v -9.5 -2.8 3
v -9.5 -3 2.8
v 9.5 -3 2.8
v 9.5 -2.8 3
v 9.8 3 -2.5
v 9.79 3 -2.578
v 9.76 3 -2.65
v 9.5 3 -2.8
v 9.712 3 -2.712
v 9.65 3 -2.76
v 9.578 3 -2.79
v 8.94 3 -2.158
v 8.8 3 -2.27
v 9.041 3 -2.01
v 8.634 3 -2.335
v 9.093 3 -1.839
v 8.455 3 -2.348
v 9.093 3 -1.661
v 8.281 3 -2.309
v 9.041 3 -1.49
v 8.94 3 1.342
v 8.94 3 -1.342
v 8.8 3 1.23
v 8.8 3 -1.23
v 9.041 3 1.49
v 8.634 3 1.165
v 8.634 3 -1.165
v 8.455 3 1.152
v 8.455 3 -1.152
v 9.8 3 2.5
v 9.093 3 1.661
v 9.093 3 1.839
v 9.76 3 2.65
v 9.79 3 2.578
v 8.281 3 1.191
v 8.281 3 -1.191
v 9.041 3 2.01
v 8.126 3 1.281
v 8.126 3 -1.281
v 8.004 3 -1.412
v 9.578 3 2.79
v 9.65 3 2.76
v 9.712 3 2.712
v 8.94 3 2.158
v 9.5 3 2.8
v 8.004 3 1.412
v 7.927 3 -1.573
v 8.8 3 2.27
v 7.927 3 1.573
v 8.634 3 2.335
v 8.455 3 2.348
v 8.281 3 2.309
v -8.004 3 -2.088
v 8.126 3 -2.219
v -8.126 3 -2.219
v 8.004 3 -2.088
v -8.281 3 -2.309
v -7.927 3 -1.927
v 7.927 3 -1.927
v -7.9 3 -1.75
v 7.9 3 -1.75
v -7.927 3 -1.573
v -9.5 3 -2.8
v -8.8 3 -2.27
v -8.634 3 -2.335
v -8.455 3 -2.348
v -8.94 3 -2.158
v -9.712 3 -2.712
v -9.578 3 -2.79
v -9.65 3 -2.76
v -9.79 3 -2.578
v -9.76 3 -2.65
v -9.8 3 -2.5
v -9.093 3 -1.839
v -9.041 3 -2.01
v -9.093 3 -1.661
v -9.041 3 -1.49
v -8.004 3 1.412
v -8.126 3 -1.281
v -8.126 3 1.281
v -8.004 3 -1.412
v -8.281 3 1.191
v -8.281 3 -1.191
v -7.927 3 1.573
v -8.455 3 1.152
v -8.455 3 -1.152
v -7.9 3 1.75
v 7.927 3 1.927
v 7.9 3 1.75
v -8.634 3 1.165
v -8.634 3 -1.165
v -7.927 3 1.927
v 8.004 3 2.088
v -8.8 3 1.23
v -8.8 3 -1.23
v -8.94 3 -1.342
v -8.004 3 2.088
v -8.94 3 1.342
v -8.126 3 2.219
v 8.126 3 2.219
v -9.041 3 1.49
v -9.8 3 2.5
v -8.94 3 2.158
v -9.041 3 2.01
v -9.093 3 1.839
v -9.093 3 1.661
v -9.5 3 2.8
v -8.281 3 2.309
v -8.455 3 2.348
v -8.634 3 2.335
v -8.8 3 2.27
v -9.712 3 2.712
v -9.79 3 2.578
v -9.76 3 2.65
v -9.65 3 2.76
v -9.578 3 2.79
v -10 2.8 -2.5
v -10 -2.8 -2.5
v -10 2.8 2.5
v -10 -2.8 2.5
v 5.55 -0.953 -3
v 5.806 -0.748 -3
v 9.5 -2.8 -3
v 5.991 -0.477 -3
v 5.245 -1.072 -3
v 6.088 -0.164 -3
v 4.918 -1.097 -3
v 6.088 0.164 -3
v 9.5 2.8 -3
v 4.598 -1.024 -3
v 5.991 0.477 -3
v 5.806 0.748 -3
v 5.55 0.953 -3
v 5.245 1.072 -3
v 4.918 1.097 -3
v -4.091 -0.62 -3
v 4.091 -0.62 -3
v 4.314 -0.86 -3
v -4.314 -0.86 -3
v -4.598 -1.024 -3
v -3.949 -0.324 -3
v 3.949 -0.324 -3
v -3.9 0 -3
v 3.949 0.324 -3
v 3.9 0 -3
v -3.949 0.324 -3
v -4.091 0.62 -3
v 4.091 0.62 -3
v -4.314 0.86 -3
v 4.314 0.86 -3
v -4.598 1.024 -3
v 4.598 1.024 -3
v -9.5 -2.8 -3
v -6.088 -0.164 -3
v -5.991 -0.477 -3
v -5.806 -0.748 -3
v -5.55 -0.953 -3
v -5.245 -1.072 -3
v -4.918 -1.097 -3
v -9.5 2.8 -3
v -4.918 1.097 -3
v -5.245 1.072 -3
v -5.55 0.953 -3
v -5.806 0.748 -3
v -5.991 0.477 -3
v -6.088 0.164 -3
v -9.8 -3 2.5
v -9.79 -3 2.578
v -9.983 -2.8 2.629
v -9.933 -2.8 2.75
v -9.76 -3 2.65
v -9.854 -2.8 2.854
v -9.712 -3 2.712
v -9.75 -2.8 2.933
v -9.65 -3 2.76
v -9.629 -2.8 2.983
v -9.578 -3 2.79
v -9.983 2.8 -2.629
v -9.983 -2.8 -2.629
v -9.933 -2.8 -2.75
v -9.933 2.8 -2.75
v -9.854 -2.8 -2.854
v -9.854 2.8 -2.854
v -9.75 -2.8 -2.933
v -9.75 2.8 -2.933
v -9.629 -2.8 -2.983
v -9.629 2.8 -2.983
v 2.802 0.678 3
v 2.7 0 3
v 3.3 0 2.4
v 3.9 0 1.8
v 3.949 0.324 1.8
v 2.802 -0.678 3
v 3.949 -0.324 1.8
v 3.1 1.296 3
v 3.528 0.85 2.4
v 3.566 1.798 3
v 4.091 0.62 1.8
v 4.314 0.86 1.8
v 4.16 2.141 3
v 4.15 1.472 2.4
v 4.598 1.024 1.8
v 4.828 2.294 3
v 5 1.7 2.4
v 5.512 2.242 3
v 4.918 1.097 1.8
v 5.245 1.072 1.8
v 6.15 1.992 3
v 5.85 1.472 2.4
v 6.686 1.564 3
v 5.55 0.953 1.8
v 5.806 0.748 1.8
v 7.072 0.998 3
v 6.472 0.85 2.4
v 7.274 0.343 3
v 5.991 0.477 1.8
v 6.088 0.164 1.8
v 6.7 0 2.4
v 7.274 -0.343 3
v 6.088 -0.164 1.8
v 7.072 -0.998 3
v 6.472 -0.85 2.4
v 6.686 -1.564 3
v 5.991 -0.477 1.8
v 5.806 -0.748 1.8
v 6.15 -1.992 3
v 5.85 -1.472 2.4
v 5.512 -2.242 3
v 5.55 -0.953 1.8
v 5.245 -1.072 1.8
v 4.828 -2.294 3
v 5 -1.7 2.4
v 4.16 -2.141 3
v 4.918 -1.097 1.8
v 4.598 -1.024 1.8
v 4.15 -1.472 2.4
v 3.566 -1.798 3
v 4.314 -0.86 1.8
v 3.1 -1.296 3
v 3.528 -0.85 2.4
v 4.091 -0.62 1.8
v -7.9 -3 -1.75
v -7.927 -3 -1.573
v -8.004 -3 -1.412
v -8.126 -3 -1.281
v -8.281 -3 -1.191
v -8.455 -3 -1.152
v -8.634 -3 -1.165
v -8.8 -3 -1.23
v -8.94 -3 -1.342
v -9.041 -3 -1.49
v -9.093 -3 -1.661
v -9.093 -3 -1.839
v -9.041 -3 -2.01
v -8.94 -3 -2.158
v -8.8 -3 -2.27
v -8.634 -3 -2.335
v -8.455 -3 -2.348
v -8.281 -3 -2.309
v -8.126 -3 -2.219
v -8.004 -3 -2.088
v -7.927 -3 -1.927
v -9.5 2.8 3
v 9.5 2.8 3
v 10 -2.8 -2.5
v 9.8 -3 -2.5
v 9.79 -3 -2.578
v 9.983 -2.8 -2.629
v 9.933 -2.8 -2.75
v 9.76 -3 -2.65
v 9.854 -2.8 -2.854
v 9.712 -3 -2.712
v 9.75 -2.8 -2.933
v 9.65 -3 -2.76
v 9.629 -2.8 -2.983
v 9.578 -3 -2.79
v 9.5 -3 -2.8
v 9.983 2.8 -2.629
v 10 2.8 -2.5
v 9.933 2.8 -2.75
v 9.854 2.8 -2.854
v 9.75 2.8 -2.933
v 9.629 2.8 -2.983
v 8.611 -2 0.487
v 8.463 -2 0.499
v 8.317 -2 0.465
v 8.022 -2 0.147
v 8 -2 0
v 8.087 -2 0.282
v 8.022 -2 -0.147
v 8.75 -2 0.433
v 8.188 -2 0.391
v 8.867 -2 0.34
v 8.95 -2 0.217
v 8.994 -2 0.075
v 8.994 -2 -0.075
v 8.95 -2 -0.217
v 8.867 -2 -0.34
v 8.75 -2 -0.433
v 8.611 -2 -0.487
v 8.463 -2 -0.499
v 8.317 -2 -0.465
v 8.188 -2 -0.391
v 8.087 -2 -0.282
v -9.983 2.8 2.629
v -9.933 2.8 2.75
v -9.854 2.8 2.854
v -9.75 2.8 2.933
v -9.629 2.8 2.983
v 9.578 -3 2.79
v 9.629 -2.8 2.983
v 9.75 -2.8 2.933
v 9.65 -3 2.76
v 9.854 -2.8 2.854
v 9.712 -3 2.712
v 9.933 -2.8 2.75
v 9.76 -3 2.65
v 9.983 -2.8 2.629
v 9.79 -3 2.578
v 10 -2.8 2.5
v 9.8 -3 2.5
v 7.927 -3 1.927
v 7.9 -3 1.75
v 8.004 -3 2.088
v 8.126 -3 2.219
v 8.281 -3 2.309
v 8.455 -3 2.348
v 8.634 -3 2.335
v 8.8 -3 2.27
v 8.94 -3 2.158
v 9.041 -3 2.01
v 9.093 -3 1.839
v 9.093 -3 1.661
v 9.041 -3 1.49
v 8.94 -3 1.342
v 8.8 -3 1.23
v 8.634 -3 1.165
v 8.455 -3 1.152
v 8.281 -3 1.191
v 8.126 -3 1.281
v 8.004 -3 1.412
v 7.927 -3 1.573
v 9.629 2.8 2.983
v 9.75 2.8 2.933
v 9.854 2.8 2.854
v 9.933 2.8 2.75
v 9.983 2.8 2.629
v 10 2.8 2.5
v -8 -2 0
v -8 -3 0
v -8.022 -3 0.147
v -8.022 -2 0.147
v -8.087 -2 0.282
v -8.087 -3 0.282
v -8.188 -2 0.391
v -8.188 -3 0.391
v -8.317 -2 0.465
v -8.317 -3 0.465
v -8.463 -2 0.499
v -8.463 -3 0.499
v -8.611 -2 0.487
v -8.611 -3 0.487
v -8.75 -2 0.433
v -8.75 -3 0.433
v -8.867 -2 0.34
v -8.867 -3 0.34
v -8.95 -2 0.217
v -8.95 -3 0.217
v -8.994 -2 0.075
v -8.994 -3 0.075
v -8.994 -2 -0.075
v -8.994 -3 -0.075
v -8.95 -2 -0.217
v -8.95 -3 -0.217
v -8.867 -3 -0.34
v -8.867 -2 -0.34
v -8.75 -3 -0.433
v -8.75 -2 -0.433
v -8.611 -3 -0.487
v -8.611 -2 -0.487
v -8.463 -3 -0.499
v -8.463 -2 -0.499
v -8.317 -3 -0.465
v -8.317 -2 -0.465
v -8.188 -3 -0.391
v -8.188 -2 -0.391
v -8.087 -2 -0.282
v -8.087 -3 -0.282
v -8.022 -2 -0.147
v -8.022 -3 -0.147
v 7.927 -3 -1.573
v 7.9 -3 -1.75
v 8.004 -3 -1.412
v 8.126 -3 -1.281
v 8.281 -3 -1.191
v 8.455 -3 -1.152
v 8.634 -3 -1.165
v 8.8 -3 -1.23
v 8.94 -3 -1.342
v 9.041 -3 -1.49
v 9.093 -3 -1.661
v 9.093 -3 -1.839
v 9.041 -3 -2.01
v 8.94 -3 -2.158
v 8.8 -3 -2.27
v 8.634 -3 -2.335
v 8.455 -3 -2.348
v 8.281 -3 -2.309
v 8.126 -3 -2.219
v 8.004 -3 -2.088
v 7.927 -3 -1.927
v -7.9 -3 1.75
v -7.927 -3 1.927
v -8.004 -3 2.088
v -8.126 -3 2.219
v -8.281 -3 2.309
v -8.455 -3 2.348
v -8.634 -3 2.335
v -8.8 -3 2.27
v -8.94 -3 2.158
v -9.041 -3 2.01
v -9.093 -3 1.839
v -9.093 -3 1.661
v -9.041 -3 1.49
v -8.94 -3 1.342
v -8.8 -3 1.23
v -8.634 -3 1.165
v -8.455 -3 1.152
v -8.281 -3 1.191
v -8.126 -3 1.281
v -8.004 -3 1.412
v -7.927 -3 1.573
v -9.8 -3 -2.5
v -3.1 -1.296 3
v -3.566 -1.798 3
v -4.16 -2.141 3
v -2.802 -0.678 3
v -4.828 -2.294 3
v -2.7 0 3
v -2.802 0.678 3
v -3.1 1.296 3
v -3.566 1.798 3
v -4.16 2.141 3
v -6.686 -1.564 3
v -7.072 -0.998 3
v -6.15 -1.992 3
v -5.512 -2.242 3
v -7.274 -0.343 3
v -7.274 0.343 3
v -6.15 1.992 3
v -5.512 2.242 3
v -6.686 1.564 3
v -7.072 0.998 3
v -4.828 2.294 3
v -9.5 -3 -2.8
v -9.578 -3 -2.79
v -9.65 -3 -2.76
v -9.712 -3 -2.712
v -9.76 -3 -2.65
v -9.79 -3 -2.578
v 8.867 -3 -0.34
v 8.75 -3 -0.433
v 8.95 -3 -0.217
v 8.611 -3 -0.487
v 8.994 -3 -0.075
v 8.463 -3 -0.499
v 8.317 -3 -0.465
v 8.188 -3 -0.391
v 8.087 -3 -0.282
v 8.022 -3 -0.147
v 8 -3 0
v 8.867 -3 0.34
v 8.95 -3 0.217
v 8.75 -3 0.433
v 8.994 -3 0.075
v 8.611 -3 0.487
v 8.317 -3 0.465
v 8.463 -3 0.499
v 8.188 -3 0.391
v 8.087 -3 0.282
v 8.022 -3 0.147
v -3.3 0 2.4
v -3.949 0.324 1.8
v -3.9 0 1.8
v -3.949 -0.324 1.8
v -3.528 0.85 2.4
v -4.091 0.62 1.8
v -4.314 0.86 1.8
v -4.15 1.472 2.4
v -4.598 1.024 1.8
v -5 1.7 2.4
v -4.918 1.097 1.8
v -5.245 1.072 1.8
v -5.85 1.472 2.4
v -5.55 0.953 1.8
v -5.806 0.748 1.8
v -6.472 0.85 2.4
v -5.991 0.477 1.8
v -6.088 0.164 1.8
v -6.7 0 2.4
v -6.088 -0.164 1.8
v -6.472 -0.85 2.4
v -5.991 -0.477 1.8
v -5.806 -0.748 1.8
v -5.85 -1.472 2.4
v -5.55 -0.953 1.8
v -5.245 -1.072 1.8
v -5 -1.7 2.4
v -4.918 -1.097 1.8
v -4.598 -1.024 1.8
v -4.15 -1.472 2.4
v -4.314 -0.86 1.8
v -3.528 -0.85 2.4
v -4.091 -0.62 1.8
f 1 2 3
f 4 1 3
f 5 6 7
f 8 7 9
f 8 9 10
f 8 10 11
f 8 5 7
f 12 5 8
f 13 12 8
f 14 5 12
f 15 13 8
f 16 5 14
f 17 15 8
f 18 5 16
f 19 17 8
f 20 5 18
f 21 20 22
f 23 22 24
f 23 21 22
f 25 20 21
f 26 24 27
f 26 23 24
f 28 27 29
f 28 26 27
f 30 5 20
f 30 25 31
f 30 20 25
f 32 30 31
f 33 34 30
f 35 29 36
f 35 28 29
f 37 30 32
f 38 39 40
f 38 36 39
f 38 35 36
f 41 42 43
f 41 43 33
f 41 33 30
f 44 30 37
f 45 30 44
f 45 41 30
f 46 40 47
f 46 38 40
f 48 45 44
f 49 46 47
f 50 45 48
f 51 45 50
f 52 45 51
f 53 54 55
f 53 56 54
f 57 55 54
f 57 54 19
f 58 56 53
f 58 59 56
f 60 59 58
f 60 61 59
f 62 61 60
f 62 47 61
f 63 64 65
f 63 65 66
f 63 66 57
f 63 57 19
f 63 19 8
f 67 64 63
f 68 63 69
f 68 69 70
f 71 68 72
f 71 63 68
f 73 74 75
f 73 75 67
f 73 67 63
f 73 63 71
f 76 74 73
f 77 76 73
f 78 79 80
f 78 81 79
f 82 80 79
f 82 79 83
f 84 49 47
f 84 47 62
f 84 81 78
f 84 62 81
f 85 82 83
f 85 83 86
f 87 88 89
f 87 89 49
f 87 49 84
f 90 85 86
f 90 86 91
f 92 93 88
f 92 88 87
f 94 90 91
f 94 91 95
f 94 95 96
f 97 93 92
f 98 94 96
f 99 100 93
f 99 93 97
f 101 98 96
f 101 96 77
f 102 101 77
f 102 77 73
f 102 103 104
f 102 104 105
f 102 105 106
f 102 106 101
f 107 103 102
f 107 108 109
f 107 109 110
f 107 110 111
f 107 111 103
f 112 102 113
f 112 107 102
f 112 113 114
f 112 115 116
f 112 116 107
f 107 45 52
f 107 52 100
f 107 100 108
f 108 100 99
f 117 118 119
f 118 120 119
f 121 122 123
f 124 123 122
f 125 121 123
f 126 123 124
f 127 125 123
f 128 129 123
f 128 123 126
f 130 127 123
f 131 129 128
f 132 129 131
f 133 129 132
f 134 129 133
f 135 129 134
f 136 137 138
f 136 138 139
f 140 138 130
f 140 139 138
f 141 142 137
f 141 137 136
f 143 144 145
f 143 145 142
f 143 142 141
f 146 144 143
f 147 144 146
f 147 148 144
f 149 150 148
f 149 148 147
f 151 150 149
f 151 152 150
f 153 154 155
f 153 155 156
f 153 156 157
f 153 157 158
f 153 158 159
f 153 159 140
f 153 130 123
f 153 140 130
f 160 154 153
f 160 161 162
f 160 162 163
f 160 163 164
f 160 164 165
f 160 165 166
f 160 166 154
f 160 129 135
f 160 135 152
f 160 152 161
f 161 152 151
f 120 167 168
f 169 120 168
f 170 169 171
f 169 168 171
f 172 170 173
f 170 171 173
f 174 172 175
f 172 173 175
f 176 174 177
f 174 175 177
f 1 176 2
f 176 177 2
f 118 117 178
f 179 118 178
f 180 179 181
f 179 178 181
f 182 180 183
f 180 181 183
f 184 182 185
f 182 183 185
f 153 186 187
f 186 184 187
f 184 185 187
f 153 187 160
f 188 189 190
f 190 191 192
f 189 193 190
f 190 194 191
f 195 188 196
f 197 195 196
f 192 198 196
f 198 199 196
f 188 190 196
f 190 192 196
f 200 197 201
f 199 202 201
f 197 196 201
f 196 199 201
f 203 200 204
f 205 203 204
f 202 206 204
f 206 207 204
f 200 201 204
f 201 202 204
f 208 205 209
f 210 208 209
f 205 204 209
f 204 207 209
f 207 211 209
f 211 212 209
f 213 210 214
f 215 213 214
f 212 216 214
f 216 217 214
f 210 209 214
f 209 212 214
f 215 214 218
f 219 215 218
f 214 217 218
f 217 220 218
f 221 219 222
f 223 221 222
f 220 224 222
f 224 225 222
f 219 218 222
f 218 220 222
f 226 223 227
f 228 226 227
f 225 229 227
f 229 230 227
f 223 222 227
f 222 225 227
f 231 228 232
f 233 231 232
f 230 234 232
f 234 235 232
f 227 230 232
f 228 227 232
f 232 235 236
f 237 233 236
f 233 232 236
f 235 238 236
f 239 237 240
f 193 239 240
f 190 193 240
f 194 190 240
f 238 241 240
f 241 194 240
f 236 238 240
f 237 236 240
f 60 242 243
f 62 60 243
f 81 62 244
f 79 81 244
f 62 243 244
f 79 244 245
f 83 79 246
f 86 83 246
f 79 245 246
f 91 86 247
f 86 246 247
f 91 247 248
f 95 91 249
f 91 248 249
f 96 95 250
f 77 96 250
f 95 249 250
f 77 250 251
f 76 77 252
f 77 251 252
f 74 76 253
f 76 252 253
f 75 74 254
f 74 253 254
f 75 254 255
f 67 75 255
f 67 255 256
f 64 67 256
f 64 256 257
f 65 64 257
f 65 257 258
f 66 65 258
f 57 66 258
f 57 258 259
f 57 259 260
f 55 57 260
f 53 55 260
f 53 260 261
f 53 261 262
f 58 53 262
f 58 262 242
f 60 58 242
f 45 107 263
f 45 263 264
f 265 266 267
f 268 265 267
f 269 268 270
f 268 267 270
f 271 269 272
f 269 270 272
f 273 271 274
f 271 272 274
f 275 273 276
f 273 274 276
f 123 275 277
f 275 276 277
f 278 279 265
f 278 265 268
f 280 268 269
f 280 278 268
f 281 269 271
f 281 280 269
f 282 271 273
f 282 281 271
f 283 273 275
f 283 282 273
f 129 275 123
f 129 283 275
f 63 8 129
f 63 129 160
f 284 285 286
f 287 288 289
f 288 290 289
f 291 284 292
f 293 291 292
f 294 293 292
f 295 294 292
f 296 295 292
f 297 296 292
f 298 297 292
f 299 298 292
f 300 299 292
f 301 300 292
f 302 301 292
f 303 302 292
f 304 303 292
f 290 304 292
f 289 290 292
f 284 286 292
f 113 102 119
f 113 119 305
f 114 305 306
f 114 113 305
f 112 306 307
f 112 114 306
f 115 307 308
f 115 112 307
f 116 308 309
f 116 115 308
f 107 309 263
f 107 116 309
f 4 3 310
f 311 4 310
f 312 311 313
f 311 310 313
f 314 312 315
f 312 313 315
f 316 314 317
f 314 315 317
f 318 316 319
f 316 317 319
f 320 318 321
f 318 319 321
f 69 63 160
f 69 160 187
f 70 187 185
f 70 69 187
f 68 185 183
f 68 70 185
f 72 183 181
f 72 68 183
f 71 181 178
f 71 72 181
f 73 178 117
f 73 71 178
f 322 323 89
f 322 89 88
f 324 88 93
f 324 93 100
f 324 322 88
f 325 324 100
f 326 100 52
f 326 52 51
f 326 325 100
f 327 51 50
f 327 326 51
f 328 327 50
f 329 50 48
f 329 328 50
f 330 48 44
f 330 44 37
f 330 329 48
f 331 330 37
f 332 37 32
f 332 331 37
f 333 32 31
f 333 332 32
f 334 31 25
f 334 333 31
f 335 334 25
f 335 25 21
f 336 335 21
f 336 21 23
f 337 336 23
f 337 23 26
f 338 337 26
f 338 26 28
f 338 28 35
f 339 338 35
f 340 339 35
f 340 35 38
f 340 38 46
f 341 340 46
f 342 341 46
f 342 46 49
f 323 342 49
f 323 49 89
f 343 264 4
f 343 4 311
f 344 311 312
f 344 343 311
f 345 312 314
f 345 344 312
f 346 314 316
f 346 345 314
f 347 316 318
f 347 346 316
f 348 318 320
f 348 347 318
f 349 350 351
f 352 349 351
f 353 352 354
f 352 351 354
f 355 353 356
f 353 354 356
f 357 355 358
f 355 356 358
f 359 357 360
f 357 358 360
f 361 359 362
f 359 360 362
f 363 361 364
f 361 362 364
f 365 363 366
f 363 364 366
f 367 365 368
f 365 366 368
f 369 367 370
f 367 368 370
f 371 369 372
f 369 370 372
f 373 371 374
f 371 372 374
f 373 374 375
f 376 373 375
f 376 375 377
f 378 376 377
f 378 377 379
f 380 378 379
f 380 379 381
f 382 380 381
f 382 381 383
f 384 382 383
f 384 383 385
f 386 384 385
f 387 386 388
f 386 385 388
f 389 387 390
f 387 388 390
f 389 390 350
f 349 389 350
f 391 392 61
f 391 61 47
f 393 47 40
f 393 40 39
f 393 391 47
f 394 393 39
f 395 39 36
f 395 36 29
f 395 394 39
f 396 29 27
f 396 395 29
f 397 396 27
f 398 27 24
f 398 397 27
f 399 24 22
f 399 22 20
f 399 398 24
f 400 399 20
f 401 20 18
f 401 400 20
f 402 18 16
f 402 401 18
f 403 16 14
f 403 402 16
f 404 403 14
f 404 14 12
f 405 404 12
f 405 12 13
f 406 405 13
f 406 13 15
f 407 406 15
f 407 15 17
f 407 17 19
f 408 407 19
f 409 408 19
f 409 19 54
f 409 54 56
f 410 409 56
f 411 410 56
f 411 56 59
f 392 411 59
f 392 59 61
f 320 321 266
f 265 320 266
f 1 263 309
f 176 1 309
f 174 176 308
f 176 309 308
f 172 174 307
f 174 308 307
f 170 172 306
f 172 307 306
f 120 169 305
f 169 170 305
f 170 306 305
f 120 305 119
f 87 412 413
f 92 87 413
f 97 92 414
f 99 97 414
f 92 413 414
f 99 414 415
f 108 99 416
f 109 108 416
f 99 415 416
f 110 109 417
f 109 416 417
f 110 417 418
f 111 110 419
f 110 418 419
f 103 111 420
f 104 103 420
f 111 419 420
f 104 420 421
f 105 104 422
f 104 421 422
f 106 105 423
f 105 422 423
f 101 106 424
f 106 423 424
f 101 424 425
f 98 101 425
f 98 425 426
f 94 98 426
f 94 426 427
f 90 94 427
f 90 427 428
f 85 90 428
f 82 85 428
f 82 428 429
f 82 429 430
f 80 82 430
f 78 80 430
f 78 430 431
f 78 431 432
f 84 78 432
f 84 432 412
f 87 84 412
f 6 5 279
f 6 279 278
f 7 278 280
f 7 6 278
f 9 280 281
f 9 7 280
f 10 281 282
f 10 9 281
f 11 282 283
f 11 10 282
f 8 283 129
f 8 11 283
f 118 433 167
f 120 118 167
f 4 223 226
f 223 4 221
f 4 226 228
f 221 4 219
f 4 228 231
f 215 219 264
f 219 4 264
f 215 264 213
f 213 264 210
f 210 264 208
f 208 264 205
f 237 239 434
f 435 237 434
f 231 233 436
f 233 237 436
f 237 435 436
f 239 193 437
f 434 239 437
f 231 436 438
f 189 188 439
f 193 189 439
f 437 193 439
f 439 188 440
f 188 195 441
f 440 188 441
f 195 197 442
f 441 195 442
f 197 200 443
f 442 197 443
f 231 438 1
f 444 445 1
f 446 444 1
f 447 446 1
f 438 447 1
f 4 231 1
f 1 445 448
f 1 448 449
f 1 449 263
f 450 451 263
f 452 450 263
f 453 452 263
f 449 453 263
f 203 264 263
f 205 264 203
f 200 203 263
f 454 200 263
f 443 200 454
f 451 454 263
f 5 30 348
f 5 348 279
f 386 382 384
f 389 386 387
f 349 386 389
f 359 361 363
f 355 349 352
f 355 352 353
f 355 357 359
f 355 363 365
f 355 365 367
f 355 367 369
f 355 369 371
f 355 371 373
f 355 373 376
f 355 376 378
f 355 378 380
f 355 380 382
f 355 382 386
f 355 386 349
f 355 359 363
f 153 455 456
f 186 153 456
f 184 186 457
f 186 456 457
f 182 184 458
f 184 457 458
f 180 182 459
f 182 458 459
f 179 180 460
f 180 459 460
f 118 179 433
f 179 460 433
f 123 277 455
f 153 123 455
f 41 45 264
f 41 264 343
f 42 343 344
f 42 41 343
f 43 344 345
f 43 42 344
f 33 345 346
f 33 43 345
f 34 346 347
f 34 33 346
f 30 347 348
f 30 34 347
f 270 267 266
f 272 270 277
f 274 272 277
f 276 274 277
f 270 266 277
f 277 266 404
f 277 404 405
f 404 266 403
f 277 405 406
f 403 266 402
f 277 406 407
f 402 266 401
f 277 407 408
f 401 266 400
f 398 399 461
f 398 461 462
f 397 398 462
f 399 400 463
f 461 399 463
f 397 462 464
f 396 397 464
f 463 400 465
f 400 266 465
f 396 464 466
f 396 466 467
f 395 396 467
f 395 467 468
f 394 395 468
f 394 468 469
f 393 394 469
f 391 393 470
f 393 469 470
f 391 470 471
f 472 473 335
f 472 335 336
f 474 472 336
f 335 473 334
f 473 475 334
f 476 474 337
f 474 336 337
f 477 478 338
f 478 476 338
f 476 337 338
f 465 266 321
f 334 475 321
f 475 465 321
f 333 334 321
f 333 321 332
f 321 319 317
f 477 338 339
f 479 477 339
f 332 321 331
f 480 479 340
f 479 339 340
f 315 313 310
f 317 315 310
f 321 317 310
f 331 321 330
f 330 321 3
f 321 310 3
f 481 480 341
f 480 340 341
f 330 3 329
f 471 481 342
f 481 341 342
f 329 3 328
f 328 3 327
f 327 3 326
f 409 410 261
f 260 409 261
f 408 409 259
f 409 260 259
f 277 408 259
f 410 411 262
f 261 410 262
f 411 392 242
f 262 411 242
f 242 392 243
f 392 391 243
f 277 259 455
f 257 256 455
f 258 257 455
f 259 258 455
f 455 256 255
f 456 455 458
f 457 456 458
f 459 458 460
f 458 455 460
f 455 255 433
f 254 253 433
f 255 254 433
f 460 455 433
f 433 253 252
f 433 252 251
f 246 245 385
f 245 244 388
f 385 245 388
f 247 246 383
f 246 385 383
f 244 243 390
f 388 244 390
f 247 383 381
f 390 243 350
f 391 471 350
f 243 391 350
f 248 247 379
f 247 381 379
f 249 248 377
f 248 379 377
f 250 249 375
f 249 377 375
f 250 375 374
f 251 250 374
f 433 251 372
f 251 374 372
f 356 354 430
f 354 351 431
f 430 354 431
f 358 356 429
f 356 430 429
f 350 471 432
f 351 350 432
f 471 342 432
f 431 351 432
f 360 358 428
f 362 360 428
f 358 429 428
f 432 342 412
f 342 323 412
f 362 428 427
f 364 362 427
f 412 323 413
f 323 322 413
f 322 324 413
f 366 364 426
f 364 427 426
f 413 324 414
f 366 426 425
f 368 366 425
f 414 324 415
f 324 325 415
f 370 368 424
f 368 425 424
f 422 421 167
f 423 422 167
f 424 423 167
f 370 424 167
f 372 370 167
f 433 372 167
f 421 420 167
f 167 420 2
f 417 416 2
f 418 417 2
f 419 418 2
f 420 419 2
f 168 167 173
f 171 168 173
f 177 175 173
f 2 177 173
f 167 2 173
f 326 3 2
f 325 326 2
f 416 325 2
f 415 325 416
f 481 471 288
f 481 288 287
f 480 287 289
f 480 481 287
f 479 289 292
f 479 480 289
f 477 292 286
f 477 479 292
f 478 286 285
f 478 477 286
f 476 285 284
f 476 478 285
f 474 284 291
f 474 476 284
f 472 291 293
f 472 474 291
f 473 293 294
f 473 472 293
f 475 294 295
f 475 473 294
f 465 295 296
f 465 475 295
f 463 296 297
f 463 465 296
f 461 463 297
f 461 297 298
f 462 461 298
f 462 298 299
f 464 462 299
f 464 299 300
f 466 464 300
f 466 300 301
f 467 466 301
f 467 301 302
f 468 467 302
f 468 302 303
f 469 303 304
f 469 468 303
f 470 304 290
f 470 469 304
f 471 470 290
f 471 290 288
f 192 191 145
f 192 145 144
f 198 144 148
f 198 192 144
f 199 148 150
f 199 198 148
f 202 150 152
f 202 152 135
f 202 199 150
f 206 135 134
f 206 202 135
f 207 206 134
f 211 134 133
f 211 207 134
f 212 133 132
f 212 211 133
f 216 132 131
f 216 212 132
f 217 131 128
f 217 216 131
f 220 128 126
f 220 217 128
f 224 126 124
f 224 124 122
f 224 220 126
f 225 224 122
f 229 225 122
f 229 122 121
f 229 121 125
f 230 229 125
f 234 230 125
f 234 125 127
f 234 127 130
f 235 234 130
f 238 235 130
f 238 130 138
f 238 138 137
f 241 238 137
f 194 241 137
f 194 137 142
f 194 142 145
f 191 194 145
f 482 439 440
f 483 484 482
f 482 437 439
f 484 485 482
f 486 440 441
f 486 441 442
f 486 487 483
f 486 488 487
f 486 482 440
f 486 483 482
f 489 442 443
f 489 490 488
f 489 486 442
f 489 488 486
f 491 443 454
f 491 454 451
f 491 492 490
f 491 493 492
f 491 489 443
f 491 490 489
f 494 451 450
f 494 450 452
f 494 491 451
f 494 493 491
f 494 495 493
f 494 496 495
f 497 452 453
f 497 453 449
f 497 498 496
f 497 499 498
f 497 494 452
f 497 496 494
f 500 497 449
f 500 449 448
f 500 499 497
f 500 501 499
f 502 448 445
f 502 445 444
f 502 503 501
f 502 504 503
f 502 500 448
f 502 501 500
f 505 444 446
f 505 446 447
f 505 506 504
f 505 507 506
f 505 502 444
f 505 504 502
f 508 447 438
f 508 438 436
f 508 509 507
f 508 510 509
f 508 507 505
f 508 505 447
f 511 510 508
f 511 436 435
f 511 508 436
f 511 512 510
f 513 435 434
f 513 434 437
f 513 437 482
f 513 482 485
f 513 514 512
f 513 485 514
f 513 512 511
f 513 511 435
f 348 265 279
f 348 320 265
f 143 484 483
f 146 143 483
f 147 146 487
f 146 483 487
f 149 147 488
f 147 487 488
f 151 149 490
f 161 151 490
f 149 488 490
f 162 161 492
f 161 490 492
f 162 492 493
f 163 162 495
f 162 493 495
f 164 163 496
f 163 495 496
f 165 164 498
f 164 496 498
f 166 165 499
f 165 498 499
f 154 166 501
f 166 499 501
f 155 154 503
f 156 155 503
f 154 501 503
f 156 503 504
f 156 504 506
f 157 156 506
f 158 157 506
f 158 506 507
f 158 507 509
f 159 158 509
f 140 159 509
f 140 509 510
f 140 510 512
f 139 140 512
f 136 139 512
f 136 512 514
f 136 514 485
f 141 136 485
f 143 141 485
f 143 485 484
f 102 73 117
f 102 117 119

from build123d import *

# Parameters (mm, degrees)
SKETCH_W        = 10
SKETCH_H        = 6
PAD_DEPTH       = 3
SKETCH001_R     = 1.1
POCKET_DEPTH    = 6.001
SKETCH002_R     = 0.5
POCKET001_DEPTH = 1
CHAMFER_SIZE    = 1.2
SKETCH004_R     = 0.6
POCKET002_DEPTH = 6.001
FILLET_R        = 0.5
CHAMFER001_SIZE = 0.2


with BuildPart() as part:
    # Sketch → Pad (new body, symmetric)
    with BuildSketch(Plane.XY):
        with Locations((-5, 0)):
            Rectangle(SKETCH_W, SKETCH_H)
    extrude(amount=PAD_DEPTH, both=True)

    # Sketch001 (on Face6 of Pad) → Pocket (cut, through all)
    with BuildSketch(Plane.XY.offset(3)):
        with Locations((-5, 0)):
            Circle(SKETCH001_R)
    extrude(amount=-POCKET_DEPTH, mode=Mode.SUBTRACT)

    # Sketch002 (on Face1 of Pocket) → Pocket001 (cut)
    with BuildSketch(Plane.XZ.offset(3)):
        with Locations((-8.5, 0)):
            Circle(SKETCH002_R)
    extrude(amount=-POCKET001_DEPTH, mode=Mode.SUBTRACT)

    # Chamfer
    chamfer_edges = [part.edges().sort_by_distance(p)[0] for p in [
        (-6.1, 0, 3),
    ]]
    chamfer(chamfer_edges, length=CHAMFER_SIZE)

    # Sketch004 (on Face3 of Chamfer) → Pocket002 (cut, through all)
    with BuildSketch(Plane.XZ.offset(3)):
        with Locations((-8.5, 1.75)):
            Circle(SKETCH004_R)
        with Locations((-8.5, -1.75)):
            Circle(SKETCH004_R)
    extrude(amount=-POCKET002_DEPTH, mode=Mode.SUBTRACT)

    # Fillet
    fillet_edges = [part.edges().sort_by_distance(p)[0] for p in [
        (-10, 0, 3),
        (-10, 0, -3),
    ]]
    fillet(fillet_edges, radius=FILLET_R)

    # Mirrored: part across YZ


with BuildPart() as part_1:
    add(part.part)
    add(part.part.mirror(Plane.YZ))

    # Chamfer001
    chamfer001_edges = [part_1.edges().sort_by_distance(p)[0] for p in [
        (10, 3, 0),
        (0, -3, 3),
    ]]
    chamfer(chamfer001_edges, length=CHAMFER001_SIZE)


solid = part_1.part
